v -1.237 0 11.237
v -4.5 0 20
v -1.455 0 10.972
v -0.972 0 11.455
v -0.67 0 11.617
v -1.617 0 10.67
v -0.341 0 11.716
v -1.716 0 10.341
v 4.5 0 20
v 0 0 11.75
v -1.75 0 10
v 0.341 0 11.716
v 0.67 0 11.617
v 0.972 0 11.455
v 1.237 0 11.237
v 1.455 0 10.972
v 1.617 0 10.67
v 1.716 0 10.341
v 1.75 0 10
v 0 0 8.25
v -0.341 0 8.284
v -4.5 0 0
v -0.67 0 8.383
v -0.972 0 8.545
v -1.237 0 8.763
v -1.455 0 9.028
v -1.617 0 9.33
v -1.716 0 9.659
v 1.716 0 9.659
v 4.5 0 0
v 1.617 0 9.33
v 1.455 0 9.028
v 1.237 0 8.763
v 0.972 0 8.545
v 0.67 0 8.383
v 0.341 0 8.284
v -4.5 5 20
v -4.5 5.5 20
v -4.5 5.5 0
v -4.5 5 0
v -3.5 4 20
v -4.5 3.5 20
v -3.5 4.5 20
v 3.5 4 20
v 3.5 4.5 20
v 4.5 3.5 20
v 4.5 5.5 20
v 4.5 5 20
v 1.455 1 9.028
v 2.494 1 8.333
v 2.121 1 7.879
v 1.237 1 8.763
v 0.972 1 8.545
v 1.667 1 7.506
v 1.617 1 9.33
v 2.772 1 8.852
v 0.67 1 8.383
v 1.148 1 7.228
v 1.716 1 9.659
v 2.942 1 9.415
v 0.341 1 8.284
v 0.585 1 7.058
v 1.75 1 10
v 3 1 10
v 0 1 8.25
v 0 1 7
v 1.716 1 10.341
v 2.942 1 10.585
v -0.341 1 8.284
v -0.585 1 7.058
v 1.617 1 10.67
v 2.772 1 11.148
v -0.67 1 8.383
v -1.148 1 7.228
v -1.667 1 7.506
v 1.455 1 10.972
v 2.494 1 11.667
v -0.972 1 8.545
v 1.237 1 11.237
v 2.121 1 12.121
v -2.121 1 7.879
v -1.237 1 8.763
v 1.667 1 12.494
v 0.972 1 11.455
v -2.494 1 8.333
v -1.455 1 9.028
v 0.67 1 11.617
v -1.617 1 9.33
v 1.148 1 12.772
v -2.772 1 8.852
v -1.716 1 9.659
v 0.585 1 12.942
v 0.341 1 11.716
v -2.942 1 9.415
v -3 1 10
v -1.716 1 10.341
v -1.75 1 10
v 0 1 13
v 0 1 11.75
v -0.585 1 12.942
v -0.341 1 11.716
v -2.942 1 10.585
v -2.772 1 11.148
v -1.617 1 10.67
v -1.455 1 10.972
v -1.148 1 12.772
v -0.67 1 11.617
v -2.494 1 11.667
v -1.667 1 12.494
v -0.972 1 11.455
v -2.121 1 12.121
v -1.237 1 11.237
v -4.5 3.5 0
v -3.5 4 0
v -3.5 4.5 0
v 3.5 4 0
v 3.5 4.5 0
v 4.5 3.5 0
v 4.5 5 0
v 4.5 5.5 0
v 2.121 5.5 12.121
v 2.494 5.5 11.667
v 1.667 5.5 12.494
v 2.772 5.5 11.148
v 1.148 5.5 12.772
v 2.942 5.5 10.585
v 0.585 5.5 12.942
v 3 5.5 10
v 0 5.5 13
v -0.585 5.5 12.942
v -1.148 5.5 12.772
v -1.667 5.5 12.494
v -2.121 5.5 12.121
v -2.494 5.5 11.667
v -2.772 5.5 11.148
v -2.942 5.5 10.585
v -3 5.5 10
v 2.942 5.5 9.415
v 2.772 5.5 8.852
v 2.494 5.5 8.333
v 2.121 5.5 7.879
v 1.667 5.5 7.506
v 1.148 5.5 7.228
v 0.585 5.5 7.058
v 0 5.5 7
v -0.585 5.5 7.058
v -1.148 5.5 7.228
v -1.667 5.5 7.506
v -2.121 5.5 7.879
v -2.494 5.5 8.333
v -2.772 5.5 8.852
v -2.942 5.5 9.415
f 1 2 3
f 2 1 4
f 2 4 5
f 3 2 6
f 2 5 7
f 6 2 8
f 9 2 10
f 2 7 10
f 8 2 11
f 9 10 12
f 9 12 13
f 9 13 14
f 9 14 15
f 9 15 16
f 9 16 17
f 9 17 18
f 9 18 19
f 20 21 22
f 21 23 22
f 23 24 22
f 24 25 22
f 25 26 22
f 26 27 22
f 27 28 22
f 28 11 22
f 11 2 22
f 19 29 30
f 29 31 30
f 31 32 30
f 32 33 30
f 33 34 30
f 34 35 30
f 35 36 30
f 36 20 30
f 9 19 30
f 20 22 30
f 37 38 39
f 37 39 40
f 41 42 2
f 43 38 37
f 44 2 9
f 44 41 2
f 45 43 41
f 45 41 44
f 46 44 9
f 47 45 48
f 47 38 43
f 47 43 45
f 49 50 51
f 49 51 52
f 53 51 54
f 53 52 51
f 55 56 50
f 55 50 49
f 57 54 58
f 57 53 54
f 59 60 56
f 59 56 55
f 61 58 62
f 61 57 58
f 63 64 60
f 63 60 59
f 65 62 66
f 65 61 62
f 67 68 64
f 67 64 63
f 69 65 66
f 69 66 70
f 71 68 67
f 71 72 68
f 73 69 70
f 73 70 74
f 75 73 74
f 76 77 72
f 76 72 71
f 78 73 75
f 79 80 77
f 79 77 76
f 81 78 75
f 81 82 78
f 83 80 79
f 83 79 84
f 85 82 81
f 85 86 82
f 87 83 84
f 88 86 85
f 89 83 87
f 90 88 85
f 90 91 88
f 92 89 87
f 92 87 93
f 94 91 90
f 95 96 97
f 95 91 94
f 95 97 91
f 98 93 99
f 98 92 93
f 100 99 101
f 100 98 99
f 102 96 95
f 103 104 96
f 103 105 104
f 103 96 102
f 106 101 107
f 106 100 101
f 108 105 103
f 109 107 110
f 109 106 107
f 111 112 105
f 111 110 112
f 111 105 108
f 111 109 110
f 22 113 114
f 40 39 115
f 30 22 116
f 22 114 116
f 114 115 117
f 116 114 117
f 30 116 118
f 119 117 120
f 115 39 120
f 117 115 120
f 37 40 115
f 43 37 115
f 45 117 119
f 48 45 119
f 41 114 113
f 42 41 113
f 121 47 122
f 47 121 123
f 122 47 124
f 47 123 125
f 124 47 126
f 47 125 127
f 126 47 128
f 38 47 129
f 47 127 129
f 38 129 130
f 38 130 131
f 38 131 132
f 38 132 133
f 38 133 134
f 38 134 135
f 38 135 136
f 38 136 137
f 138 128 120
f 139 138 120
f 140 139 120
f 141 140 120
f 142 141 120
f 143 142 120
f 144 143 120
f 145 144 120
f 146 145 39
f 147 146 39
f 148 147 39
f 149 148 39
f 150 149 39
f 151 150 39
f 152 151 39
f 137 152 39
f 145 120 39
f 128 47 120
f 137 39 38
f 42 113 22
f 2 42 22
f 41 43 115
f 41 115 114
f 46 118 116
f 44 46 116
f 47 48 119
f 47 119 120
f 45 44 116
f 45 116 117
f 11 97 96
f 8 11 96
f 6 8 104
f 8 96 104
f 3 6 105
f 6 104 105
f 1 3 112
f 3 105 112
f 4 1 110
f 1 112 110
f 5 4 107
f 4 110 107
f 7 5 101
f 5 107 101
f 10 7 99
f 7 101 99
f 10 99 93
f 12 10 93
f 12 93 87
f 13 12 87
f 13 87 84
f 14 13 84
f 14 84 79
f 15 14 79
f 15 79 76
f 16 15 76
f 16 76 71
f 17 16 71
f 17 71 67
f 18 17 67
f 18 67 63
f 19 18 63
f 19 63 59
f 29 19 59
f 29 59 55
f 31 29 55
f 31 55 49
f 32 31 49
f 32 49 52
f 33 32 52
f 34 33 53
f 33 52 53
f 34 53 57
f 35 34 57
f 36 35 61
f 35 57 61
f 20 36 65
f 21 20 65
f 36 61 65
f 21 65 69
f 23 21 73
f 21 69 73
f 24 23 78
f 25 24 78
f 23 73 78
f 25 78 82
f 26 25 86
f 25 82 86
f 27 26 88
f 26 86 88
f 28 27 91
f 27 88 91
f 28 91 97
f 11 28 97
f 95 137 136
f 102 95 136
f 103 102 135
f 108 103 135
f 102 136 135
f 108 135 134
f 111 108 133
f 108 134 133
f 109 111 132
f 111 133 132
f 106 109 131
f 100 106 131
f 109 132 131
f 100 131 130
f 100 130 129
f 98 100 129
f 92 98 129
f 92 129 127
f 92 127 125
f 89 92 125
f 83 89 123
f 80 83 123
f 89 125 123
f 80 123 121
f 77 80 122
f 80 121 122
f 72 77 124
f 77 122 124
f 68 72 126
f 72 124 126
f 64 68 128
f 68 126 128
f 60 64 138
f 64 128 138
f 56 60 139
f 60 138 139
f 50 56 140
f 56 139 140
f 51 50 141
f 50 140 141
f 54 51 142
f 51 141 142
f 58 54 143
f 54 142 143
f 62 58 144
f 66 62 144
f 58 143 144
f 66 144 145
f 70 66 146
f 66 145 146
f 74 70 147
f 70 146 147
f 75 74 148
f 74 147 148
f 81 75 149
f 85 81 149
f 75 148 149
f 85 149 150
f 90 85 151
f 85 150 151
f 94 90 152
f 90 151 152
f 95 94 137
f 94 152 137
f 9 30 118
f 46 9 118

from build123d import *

# Parameters (mm, degrees)
BOSS_EXTRU_1_DEPTH      = 20
ESQUISSE2_R             = 3
ENL_V_MAT_EXTRU_1_DEPTH = 4.5
ESQUISSE3_R             = 1.75
ENL_V_MAT_EXTRU_2_DEPTH = 21.988091862


with BuildPart() as part:
    # Esquisse1 → Boss.-Extru.1 (new body)
    with BuildSketch(Plane.XY):
        Polygon((-4.5, 0), (4.5, 0), (4.5, 3.5), (3.5, 4), (3.5, 4.5), (4.5, 5), (4.5, 5.5), (-4.5, 5.5), (-4.5, 5), (-3.5, 4.5), (-3.5, 4), (-4.5, 3.5), align=None)
    extrude(amount=BOSS_EXTRU_1_DEPTH)

    # Esquisse2 → Enlèv. mat.-Extru.1 (cut)
    with BuildSketch(Plane(origin=(0, 5.5, 0), x_dir=(1, 0, 0), z_dir=(0, 1, 0))):
        with Locations(Location((0, -10, 0), (0, 0, 180))):
            Circle(ESQUISSE2_R)
    extrude(amount=-ENL_V_MAT_EXTRU_1_DEPTH, mode=Mode.SUBTRACT)

    # Esquisse3 → Enlèv. mat.-Extru.2 (cut, through all)
    with BuildSketch(Plane(origin=(0, 1, 0), x_dir=(1, 0, 0), z_dir=(0, 1, 0))):
        with Locations(Location((0, -10, 0), (0, 0, 180))):
            Circle(ESQUISSE3_R)
    extrude(amount=-ENL_V_MAT_EXTRU_2_DEPTH, mode=Mode.SUBTRACT)


solid = part.part
